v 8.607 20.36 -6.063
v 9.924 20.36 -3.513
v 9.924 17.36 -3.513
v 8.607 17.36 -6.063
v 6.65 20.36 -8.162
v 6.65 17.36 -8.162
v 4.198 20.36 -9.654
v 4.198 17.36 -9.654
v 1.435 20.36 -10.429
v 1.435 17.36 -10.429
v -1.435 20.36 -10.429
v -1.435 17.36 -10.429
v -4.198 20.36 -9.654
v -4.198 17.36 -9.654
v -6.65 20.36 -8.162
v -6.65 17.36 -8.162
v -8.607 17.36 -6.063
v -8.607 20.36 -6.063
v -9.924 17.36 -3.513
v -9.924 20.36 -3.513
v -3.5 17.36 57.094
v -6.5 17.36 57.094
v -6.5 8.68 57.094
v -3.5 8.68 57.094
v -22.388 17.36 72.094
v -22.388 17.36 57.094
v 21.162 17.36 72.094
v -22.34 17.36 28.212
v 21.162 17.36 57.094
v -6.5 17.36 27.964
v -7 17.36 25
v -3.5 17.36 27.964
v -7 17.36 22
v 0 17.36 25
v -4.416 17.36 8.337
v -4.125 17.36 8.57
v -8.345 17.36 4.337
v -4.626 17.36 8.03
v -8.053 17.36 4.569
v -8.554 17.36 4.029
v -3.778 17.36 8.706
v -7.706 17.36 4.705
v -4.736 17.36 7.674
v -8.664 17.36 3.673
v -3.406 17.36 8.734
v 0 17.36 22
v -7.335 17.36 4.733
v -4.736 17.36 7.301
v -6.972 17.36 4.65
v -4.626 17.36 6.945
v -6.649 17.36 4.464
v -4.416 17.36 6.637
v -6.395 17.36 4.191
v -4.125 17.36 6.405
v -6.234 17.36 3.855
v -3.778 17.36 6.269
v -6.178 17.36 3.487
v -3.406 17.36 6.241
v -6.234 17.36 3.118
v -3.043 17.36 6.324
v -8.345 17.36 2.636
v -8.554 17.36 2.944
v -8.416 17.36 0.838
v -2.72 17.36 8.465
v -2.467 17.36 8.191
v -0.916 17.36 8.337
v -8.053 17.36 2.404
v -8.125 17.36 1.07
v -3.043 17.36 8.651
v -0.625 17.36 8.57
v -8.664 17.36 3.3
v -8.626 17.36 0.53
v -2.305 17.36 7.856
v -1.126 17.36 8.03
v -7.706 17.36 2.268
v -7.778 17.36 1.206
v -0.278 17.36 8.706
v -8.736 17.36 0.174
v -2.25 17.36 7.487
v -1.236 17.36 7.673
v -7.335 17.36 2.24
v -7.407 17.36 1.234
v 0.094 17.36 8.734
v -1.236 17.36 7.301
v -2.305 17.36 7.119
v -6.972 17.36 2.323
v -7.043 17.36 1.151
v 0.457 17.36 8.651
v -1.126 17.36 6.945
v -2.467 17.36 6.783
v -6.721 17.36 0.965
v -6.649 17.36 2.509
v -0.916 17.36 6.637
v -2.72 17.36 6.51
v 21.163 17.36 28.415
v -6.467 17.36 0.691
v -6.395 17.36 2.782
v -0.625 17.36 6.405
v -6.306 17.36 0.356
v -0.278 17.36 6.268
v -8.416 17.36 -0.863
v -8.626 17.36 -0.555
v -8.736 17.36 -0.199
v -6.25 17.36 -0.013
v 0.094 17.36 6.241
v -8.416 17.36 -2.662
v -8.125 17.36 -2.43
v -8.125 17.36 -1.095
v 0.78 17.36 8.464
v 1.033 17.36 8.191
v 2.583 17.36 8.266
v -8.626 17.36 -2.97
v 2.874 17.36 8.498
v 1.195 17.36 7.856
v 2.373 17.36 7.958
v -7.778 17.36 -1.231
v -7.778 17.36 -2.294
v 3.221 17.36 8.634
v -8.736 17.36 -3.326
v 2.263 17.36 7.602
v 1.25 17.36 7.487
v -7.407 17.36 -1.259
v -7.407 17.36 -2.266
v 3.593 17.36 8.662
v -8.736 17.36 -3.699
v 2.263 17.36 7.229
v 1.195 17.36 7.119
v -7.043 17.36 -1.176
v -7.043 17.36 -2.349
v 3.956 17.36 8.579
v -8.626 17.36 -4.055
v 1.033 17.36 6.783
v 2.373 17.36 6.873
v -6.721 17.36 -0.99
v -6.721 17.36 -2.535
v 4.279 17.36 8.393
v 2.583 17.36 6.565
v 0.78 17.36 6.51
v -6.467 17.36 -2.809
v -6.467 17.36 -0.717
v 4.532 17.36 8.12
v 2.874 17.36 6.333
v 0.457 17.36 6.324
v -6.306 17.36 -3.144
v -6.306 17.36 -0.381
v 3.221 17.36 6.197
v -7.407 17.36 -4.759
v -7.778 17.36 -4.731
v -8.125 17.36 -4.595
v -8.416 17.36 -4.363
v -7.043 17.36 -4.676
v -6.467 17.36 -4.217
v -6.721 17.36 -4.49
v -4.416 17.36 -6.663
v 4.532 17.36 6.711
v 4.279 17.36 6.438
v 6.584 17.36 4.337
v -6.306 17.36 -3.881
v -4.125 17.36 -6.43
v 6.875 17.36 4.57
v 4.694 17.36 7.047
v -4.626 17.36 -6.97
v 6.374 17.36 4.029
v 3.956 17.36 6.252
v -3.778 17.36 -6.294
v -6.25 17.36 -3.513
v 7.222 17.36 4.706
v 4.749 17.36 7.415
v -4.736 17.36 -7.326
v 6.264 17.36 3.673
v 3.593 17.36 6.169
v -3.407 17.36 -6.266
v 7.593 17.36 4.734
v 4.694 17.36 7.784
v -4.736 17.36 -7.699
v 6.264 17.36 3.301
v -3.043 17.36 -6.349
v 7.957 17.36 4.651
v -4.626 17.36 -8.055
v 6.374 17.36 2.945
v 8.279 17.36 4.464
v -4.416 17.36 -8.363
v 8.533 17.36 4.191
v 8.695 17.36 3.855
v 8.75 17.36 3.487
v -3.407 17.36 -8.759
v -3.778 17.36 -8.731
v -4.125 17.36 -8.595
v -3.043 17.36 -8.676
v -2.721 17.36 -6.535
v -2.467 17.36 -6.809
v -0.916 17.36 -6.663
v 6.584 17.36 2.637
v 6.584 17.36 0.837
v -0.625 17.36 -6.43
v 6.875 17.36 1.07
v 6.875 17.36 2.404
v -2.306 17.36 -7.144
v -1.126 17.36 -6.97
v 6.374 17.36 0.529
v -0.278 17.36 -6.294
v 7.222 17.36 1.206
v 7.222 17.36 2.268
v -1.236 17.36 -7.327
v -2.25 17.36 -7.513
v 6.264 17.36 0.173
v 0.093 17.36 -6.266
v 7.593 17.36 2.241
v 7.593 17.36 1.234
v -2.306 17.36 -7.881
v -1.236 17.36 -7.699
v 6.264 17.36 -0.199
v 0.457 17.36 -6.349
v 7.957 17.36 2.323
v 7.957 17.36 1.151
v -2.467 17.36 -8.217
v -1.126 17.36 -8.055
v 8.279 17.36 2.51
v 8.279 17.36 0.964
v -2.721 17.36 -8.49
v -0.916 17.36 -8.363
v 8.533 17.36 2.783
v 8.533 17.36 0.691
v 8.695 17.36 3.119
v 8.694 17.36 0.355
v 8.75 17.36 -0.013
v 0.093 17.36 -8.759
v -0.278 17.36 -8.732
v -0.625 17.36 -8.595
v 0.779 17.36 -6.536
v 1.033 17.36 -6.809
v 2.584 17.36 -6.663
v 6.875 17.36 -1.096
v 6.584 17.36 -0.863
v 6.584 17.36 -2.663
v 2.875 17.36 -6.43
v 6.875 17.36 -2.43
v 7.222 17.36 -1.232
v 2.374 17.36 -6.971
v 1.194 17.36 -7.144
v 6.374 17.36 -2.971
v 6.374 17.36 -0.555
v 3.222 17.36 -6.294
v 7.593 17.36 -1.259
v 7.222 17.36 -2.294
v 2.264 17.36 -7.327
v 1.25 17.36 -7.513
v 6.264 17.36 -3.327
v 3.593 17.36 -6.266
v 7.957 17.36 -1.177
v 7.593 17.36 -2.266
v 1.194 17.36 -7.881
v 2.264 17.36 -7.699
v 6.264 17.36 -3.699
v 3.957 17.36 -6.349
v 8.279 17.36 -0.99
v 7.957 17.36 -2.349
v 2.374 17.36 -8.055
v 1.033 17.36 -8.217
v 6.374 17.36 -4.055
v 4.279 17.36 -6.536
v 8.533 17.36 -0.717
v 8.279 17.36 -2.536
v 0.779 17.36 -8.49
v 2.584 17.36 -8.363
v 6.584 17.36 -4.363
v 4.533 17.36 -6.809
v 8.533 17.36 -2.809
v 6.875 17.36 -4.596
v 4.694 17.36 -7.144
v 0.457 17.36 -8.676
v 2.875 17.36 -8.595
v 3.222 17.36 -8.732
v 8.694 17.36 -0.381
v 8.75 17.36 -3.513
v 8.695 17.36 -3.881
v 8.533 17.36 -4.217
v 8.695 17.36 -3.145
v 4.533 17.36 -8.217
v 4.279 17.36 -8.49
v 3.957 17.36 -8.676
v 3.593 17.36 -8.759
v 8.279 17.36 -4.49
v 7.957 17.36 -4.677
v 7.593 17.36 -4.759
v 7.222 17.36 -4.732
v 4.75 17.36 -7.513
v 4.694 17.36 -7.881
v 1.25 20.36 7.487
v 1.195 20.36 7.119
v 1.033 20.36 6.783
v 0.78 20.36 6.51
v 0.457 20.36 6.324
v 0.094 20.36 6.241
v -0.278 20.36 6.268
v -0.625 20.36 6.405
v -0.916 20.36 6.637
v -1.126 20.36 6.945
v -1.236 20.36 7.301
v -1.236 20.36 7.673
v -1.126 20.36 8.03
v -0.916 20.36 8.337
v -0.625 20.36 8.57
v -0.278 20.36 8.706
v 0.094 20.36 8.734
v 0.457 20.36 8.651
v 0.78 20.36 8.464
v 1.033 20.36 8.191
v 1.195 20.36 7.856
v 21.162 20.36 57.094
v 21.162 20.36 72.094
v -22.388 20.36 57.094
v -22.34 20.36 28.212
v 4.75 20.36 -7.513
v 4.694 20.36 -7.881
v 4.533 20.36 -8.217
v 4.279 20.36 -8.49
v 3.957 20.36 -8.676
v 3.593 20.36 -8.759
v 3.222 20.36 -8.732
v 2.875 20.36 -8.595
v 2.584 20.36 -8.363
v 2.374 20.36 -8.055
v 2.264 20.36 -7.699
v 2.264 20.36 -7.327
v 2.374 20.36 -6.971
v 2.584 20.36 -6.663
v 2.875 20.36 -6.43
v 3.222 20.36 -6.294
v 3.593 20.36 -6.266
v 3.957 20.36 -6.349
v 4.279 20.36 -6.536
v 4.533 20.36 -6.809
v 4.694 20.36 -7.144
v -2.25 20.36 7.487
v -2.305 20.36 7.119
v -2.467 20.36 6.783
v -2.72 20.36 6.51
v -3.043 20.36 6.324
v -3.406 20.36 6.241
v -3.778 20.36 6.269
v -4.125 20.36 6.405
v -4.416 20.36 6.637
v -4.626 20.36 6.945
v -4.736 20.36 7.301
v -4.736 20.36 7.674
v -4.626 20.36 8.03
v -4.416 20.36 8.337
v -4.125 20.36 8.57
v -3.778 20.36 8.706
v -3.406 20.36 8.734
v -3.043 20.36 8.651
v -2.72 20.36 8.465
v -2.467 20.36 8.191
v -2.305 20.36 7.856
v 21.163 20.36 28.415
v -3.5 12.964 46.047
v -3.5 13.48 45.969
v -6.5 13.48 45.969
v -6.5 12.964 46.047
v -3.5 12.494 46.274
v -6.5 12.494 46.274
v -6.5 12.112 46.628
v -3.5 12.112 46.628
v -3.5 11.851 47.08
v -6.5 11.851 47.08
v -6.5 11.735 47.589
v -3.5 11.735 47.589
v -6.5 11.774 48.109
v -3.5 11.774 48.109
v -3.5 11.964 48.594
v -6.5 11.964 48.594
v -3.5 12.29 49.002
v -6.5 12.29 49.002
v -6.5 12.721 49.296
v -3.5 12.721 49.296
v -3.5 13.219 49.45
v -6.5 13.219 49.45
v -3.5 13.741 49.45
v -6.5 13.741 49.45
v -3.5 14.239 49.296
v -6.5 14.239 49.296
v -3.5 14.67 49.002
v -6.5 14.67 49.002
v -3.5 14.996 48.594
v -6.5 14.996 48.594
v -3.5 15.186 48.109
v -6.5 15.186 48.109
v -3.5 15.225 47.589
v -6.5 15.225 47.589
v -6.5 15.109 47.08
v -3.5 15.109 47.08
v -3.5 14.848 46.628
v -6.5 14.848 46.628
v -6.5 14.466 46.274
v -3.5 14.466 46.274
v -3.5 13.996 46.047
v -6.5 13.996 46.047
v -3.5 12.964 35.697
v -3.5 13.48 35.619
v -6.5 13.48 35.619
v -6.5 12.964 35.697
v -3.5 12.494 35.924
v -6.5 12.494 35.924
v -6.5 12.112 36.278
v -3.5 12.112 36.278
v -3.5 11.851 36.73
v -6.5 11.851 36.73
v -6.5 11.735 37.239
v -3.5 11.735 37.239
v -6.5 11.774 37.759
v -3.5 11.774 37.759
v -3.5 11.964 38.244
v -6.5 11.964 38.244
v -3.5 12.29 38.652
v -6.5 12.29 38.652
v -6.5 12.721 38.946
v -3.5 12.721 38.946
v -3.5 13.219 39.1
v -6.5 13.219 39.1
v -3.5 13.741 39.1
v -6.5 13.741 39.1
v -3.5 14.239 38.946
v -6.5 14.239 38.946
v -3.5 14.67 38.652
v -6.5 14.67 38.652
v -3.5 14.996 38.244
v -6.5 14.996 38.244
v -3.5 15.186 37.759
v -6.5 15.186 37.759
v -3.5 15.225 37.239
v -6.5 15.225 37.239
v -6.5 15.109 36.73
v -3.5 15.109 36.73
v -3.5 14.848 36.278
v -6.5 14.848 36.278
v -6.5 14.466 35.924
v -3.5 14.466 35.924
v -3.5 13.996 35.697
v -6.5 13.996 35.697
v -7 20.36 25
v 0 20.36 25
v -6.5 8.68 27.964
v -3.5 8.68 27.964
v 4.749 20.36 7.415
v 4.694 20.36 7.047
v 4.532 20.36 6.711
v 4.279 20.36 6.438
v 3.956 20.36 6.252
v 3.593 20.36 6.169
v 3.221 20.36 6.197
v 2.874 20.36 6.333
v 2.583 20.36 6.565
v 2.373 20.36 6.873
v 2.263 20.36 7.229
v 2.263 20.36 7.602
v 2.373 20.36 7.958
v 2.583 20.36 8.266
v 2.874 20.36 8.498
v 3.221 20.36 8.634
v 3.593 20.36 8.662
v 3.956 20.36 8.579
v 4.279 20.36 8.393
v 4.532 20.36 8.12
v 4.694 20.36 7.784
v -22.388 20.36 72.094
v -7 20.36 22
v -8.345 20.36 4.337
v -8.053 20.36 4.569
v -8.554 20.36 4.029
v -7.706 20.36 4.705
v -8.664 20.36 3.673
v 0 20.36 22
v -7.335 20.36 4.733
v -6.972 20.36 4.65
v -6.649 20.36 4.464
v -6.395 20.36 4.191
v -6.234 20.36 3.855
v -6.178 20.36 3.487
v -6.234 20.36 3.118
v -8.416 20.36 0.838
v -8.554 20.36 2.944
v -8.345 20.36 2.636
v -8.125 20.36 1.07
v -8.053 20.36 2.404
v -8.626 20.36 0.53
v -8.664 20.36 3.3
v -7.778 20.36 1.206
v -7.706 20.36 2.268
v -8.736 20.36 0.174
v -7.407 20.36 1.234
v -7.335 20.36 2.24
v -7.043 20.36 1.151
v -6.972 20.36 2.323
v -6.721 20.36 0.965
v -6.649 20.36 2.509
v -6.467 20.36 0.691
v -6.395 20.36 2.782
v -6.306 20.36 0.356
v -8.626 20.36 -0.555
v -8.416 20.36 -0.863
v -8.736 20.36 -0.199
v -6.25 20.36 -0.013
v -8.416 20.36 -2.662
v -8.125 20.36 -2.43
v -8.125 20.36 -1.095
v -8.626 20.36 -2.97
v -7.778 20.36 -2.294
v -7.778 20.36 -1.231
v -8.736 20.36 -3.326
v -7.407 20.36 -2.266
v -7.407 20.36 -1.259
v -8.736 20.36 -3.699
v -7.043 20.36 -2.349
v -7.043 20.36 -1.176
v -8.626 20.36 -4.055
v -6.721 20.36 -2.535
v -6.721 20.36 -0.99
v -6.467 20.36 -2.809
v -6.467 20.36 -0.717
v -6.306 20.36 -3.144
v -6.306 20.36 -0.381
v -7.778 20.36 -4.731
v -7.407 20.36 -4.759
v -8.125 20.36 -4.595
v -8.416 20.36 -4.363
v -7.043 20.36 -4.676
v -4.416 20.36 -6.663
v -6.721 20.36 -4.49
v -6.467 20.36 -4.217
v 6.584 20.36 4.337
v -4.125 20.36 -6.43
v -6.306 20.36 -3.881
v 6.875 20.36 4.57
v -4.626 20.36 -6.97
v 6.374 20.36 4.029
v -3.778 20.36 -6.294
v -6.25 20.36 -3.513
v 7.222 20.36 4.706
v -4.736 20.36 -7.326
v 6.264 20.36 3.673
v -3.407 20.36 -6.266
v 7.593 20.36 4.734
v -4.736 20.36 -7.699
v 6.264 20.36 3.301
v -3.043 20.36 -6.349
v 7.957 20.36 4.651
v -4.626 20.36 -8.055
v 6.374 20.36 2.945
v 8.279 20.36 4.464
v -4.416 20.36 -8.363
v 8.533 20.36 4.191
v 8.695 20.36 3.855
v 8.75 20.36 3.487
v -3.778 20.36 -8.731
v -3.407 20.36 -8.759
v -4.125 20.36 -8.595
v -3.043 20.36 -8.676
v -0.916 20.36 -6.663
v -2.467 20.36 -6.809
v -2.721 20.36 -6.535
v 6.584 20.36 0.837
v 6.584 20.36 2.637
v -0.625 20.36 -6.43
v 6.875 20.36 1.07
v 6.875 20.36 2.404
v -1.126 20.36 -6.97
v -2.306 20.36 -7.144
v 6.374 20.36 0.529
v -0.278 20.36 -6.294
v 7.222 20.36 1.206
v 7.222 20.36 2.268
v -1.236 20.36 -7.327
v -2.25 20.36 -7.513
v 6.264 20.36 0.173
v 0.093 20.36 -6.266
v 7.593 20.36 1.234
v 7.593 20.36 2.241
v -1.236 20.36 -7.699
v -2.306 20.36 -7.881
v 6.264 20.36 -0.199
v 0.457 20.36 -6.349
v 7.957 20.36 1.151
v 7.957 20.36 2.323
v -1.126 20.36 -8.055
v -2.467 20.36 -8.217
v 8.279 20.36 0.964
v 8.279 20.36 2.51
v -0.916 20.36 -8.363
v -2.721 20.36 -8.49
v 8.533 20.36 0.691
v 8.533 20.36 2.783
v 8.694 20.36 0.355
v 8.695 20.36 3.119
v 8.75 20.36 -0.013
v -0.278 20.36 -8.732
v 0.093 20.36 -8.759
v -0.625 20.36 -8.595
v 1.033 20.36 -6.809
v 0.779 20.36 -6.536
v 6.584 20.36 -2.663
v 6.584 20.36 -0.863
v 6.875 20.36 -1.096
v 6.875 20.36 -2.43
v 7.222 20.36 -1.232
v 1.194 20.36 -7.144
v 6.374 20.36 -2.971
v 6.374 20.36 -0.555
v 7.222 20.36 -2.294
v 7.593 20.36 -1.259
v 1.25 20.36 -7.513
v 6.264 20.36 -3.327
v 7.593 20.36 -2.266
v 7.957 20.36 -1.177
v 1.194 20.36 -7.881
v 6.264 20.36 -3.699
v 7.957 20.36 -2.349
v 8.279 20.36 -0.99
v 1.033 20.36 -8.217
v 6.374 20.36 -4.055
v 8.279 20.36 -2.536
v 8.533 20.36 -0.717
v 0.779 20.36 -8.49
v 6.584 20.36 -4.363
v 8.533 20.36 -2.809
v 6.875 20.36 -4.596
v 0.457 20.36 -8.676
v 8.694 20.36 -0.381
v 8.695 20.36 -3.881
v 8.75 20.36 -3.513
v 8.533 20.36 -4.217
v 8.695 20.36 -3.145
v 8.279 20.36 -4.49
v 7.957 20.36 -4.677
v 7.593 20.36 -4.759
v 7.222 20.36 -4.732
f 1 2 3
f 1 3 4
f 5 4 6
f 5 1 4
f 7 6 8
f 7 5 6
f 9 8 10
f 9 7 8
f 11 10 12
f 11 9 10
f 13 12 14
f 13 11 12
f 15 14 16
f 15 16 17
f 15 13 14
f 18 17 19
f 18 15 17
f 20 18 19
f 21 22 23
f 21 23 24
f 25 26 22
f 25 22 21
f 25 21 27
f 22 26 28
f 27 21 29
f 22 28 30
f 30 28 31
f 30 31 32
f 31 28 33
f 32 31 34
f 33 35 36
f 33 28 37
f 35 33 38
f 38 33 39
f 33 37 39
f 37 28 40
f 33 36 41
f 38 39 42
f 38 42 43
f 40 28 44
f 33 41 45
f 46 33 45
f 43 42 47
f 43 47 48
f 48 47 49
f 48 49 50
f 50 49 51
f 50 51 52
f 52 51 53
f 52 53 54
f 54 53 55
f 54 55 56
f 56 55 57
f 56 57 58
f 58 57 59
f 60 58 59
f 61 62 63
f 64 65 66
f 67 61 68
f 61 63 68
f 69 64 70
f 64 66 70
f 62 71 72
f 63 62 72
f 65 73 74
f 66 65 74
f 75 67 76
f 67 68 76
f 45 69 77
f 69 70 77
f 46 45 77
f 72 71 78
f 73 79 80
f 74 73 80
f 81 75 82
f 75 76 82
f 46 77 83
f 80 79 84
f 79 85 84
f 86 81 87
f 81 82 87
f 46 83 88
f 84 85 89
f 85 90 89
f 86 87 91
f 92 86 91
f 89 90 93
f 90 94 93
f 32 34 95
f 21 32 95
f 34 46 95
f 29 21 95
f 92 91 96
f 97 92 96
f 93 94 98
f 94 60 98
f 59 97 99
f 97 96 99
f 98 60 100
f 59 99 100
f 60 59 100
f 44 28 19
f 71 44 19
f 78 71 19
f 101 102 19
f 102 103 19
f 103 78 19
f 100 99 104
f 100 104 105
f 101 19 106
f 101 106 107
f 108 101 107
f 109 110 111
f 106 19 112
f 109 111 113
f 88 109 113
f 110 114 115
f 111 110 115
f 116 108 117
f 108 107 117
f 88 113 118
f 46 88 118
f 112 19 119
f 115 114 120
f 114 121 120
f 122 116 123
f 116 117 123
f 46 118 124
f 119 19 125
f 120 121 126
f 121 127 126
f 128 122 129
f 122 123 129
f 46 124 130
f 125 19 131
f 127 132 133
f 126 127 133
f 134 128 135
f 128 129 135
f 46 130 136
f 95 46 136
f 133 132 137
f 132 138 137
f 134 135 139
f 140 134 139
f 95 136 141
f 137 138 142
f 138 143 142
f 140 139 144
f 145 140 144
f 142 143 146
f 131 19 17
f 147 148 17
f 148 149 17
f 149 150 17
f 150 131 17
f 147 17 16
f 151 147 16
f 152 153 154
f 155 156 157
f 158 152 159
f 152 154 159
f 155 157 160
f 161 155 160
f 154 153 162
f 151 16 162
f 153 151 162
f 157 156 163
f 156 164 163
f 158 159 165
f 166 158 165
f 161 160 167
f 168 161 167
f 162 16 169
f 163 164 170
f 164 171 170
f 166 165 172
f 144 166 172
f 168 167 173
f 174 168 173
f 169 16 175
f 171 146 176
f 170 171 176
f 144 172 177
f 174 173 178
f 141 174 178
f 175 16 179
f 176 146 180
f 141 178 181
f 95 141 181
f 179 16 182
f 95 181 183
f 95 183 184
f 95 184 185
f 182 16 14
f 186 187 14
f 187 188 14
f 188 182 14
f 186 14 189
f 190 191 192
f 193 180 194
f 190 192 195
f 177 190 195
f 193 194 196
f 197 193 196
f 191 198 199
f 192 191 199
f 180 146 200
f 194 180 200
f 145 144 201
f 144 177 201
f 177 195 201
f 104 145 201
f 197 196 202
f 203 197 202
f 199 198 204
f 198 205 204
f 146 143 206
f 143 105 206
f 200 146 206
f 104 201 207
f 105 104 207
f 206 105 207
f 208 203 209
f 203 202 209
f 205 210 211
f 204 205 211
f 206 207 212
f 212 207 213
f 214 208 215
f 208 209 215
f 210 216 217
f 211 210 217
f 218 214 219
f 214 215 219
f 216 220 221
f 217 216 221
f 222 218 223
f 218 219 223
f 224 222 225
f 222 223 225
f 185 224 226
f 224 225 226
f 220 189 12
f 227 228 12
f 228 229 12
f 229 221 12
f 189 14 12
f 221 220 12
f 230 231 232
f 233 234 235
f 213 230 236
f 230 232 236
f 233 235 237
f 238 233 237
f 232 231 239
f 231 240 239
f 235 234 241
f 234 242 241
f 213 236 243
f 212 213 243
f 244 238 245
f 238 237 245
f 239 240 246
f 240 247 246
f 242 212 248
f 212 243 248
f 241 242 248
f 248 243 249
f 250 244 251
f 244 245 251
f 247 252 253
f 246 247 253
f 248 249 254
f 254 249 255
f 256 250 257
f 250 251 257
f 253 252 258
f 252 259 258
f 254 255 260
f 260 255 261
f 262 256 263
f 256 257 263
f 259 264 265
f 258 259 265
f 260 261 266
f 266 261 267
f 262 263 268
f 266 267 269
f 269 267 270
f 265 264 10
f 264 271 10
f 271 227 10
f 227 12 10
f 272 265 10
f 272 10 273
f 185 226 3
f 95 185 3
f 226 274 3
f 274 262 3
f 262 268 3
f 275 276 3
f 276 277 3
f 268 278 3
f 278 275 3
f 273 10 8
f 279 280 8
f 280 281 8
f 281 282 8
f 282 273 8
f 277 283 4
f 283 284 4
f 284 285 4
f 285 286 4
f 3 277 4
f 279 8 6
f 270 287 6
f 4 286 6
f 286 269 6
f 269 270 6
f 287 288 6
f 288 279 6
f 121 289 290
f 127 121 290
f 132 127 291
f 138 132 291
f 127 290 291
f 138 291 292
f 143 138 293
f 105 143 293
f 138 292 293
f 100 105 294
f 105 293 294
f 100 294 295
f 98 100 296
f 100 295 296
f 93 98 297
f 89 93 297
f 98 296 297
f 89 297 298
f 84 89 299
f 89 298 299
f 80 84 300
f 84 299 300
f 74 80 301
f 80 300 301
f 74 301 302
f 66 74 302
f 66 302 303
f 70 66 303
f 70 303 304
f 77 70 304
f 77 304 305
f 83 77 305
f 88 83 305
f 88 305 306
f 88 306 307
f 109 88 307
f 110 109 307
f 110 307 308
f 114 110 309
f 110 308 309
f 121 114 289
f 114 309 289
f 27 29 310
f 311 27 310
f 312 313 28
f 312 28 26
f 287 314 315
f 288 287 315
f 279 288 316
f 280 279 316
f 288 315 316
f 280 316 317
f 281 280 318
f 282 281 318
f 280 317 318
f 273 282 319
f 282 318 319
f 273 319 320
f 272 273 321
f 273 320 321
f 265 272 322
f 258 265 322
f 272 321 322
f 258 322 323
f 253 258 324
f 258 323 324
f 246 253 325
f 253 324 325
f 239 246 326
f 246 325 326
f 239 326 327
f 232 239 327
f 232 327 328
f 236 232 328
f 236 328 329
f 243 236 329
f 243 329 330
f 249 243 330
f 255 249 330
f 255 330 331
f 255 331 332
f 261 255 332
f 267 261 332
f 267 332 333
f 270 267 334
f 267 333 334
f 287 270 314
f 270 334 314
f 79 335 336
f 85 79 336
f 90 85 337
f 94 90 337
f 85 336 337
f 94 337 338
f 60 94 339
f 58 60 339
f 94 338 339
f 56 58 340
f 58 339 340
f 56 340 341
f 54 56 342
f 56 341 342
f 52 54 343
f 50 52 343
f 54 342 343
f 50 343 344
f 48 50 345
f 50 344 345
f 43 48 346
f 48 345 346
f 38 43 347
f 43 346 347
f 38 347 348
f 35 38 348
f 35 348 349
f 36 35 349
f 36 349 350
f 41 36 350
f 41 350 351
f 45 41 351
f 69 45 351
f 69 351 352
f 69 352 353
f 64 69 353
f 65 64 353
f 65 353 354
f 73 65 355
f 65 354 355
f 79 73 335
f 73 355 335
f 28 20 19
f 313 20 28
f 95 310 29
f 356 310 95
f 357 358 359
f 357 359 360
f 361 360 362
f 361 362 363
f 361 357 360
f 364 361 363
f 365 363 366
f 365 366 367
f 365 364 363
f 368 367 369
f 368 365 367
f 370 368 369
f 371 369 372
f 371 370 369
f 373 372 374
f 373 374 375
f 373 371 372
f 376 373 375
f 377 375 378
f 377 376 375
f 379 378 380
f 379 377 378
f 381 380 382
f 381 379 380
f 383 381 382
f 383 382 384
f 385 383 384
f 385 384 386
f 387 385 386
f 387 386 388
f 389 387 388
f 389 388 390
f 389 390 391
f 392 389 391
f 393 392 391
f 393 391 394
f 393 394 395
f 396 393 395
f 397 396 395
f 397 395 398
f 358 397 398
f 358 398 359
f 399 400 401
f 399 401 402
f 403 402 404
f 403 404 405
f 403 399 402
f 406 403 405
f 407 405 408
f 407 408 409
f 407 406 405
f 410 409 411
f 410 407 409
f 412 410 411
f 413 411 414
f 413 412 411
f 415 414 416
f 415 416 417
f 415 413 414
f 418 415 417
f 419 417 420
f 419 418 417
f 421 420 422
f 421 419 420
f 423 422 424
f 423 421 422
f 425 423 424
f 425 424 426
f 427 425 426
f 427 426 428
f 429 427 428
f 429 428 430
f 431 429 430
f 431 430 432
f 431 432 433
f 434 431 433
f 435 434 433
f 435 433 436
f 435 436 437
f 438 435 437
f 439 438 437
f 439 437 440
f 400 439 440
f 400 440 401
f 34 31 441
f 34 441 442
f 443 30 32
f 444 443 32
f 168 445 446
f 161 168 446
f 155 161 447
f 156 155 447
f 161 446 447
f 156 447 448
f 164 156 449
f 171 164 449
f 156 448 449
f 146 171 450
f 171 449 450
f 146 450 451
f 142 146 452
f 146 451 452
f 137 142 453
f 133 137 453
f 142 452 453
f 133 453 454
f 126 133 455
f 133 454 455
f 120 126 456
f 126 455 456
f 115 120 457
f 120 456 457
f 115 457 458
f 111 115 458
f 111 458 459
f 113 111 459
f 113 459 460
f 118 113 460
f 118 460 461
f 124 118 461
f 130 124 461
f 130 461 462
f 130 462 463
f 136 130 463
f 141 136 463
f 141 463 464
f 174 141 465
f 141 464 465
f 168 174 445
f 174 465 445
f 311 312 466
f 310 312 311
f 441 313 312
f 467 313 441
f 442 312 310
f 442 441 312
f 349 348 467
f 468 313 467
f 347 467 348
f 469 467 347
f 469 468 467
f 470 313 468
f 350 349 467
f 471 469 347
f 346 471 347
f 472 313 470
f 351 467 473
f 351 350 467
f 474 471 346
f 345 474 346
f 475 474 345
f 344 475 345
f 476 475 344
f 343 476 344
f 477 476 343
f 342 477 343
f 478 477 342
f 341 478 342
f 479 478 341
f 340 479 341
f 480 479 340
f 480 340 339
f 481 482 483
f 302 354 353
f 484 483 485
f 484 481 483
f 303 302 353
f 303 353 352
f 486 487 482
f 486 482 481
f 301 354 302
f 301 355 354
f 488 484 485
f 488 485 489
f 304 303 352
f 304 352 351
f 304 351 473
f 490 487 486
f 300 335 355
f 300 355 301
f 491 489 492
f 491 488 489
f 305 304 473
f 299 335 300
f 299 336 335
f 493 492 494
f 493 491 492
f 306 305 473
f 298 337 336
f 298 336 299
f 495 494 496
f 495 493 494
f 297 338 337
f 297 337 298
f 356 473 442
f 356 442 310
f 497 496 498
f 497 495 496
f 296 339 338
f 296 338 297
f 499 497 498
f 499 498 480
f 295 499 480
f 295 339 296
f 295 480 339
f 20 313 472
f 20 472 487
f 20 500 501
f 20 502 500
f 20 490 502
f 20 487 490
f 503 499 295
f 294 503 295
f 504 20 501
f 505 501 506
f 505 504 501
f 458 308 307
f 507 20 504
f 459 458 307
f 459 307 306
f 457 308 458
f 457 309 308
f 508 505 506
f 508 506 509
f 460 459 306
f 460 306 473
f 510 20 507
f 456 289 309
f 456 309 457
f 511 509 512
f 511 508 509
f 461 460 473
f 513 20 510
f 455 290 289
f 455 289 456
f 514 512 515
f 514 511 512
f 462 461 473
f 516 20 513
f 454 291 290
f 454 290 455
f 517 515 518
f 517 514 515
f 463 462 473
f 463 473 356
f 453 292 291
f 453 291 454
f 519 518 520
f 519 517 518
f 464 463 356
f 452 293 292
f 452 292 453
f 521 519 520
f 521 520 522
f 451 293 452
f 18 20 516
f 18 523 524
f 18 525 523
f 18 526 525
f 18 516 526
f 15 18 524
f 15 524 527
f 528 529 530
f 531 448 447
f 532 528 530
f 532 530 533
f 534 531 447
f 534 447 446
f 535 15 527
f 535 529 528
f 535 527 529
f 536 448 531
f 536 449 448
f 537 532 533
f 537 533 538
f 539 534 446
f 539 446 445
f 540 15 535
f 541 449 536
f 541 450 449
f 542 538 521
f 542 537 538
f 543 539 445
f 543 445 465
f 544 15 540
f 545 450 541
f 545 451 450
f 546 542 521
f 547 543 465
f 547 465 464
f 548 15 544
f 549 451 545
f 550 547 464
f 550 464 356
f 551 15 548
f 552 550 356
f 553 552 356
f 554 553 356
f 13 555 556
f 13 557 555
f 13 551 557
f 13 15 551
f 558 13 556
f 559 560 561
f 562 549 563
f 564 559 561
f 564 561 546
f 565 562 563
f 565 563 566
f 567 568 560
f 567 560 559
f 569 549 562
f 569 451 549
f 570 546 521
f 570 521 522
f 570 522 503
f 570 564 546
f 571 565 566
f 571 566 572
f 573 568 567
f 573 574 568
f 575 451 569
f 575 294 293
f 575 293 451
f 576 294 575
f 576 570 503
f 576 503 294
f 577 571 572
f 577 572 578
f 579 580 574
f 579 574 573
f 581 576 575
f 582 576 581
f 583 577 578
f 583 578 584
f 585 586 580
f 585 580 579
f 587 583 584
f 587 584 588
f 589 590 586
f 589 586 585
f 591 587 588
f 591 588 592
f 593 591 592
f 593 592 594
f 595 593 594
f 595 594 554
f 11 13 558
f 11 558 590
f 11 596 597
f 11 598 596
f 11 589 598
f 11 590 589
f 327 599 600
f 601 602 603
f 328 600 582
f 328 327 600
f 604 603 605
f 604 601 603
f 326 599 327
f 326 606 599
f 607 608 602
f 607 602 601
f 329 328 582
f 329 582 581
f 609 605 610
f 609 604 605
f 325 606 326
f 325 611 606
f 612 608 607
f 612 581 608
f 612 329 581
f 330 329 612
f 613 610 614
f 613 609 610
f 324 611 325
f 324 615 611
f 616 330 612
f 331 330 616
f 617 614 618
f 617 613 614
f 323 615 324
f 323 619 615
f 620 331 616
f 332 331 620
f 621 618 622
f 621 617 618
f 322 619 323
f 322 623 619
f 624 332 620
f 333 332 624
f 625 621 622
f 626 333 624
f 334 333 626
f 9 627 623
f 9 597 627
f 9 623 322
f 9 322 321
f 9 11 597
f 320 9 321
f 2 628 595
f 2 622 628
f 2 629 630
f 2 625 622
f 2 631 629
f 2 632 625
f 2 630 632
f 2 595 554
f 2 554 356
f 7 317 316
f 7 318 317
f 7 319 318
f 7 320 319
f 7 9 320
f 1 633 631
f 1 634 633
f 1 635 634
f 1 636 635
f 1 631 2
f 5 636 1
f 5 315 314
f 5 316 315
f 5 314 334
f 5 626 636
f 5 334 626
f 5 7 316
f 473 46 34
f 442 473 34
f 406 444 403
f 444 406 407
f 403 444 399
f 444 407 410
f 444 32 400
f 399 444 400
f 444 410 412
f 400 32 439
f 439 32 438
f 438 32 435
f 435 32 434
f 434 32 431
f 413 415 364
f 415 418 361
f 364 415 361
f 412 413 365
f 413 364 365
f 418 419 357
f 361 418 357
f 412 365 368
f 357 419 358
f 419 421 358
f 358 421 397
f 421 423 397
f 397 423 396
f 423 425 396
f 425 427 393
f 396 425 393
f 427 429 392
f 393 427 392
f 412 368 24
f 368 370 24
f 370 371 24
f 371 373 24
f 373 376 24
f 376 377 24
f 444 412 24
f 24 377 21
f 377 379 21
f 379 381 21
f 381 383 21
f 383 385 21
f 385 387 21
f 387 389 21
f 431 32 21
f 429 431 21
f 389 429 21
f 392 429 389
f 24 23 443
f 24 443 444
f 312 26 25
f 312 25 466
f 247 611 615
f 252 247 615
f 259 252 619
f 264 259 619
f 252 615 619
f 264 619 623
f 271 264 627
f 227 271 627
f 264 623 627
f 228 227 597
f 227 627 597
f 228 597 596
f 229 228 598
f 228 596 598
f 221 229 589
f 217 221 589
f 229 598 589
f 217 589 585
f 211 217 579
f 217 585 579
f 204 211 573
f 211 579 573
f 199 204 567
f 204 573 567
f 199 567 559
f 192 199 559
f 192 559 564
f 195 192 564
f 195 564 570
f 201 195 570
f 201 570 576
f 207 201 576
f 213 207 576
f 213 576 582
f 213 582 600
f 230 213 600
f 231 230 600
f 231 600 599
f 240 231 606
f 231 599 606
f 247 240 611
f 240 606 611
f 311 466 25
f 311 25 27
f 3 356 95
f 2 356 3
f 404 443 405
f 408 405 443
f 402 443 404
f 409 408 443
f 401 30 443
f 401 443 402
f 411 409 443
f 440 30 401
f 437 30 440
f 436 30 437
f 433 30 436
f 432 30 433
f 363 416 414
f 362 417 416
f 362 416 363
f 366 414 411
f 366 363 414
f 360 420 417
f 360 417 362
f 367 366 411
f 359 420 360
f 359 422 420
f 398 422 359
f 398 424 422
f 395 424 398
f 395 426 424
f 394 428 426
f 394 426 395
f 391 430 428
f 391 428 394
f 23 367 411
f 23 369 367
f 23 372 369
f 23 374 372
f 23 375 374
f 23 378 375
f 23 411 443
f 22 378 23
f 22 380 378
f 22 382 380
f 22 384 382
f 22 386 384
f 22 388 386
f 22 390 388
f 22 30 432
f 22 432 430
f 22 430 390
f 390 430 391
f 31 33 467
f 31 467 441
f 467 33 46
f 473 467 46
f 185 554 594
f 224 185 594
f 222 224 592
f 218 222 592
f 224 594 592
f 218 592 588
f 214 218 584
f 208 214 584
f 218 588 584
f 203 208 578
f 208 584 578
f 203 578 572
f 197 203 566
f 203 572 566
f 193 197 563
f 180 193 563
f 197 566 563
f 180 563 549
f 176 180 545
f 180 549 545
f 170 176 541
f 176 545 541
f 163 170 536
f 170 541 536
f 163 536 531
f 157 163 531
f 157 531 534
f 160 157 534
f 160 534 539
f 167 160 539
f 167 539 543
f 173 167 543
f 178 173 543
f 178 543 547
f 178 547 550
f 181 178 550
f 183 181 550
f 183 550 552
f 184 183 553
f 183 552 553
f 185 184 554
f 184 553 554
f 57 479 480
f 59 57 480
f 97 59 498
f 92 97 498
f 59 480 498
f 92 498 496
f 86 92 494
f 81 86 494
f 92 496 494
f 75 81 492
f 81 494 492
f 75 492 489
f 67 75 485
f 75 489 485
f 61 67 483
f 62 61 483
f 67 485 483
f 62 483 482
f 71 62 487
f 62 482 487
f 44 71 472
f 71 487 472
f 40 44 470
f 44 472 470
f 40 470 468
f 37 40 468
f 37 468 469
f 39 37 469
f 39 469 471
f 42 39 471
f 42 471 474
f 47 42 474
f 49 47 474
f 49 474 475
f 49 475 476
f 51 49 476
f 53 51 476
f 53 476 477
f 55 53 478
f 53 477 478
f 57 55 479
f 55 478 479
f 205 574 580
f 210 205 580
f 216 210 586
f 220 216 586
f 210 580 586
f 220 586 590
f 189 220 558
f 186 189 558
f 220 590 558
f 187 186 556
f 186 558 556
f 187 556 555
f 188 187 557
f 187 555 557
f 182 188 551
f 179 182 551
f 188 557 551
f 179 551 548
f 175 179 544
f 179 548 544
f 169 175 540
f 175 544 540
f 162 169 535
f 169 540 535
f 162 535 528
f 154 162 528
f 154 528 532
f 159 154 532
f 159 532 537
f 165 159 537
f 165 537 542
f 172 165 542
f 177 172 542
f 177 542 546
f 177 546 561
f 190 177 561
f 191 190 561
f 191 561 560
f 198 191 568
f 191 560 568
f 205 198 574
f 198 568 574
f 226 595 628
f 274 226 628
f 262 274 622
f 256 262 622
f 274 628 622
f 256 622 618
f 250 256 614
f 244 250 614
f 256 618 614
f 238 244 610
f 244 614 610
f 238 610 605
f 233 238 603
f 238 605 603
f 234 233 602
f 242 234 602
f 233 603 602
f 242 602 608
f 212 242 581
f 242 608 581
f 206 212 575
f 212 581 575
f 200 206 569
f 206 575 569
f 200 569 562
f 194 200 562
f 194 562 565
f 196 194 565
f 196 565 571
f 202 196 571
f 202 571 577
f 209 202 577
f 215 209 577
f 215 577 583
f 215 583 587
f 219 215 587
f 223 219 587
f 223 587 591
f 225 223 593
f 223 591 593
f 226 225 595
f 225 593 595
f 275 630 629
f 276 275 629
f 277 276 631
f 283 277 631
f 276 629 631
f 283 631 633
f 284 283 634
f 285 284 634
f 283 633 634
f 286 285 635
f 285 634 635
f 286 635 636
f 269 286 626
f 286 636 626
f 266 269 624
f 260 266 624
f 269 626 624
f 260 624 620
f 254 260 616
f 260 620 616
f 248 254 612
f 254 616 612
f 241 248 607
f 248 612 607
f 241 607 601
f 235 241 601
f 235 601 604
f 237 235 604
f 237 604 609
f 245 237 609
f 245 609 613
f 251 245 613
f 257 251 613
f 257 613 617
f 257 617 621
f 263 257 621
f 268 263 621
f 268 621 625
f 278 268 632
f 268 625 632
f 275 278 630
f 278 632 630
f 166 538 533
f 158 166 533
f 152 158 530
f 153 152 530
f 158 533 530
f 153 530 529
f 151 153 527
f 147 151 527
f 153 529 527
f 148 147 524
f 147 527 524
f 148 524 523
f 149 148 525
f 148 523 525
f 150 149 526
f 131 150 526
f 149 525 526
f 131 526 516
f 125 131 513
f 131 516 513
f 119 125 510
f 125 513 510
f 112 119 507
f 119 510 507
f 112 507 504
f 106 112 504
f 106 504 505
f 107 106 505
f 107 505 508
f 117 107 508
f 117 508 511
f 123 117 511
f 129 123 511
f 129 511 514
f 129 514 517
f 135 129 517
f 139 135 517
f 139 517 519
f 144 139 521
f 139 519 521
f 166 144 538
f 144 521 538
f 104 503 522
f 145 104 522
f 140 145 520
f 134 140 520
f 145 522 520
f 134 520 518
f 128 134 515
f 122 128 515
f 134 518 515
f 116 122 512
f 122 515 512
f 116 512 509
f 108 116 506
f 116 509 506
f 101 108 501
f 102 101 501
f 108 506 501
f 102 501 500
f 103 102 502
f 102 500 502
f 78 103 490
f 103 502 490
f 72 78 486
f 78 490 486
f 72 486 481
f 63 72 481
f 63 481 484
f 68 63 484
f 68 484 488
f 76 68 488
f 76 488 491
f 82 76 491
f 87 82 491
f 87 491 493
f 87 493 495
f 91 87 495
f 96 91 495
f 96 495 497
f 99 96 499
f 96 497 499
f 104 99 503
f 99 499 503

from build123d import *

# Parameters (mm, degrees)
SKETCH2_R           = 1.25
BOSS_EXTRUDE1_DEPTH = 3
SKETCH6_W           = 3
SKETCH6_H           = 29.12999922
BOSS_EXTRUDE3_DEPTH = 11.68
SKETCH9_R           = 1.75
CUT_EXTRUDE2_DEPTH  = 5
SKETCH10_W          = 43.550923211
SKETCH10_H          = 3
BOSS_EXTRUDE4_DEPTH = 15
SKETCH11_W          = 7
SKETCH11_H          = 3
CUT_EXTRUDE3_DEPTH  = 10


with BuildPart() as part:
    # Sketch2 → Boss-Extrude1 (new body)
    with BuildSketch(Plane(origin=(0, 0, 0), x_dir=(1, 0, 0), z_dir=(0, 1, 0))):
        with BuildLine():
            ThreePointArc((9.924191255, 3.512841719), (0, 10.527565199), (-9.924191255, 3.512841719))
            Line((-9.924191255, 3.512841719), (-22.339897891, -28.212185032))
            Line((-22.339897891, -28.212185032), (-22.388445596, -57.094438481))
            Line((-22.388445596, -57.094438481), (21.162477615, -57.094438481))
            Line((21.162477615, -57.094438481), (21.162544036, -28.414715022))
            Line((21.162544036, -28.414715022), (9.924191255, 3.512841719))
        make_face()
        with Locations((-3.499861001, -7.487216855)):
            Circle(SKETCH2_R, mode=Mode.SUBTRACT)
        with Locations((-7.42819985, -3.486548919)):
            Circle(SKETCH2_R, mode=Mode.SUBTRACT)
        with Locations((-7.499989222, 0.012714758)):
            Circle(SKETCH2_R, mode=Mode.SUBTRACT)
        with Locations((-7.500049059, 3.512714758)):
            Circle(SKETCH2_R, mode=Mode.SUBTRACT)
        with Locations((-3.500117445, 7.512783142)):
            Circle(SKETCH2_R, mode=Mode.SUBTRACT)
        with Locations((0.000138999, -7.487157018)):
            Circle(SKETCH2_R, mode=Mode.SUBTRACT)
        with Locations((3.499402676, -7.415367646)):
            Circle(SKETCH2_R, mode=Mode.SUBTRACT)
        with Locations((7.500070612, -3.487028797)):
            Circle(SKETCH2_R, mode=Mode.SUBTRACT)
        with Locations((7.500010775, 0.012971203)):
            Circle(SKETCH2_R, mode=Mode.SUBTRACT)
        with Locations((-0.000117446, 7.512842979)):
            Circle(SKETCH2_R, mode=Mode.SUBTRACT)
        with Locations((3.499882554, 7.512902816)):
            Circle(SKETCH2_R, mode=Mode.SUBTRACT)
        with Locations((7.500070612, 3.512971202)):
            Circle(SKETCH2_R, mode=Mode.SUBTRACT)
    extrude(amount=-BOSS_EXTRUDE1_DEPTH)

    # Sketch6 → Boss-Extrude3 (add)
    with BuildSketch(Plane.XZ.offset(3)):
        with Locations((-5, 42.529438871)):
            Rectangle(SKETCH6_W, SKETCH6_H)
    extrude(amount=-BOSS_EXTRUDE3_DEPTH)

    # Sketch9 → Cut-Extrude2 (cut)
    with BuildSketch(Plane(origin=(-3.5, 0, 0), x_dir=(0, 0, -1), z_dir=(1, 0, 0))):
        with Locations((-37.369439261, 3.88)):
            Circle(SKETCH9_R)
        with Locations((-47.719439261, 3.88)):
            Circle(SKETCH9_R)
    extrude(amount=-CUT_EXTRUDE2_DEPTH, mode=Mode.SUBTRACT)


with BuildPart() as body_2:
    # Mirror1: mirrored copy
    add(part.part.mirror(Plane(origin=(0, 8.68, 0), x_dir=(0, 0, 1), z_dir=(0, -1, 0))))

    # Sketch10 → Boss-Extrude4 (add)
    with BuildSketch(Plane.XY.offset(57.094438481)):
        with Locations((-0.612983991, 18.86)):
            Rectangle(SKETCH10_W, SKETCH10_H)
    extrude(amount=BOSS_EXTRUDE4_DEPTH)

    # Sketch11 → Cut-Extrude3 (cut)
    with BuildSketch(Plane.XZ.offset(-17.36)):
        with Locations((-3.5, 23.5)):
            Rectangle(SKETCH11_W, SKETCH11_H)
    extrude(amount=-CUT_EXTRUDE3_DEPTH, mode=Mode.SUBTRACT)


solid = body_2.part
